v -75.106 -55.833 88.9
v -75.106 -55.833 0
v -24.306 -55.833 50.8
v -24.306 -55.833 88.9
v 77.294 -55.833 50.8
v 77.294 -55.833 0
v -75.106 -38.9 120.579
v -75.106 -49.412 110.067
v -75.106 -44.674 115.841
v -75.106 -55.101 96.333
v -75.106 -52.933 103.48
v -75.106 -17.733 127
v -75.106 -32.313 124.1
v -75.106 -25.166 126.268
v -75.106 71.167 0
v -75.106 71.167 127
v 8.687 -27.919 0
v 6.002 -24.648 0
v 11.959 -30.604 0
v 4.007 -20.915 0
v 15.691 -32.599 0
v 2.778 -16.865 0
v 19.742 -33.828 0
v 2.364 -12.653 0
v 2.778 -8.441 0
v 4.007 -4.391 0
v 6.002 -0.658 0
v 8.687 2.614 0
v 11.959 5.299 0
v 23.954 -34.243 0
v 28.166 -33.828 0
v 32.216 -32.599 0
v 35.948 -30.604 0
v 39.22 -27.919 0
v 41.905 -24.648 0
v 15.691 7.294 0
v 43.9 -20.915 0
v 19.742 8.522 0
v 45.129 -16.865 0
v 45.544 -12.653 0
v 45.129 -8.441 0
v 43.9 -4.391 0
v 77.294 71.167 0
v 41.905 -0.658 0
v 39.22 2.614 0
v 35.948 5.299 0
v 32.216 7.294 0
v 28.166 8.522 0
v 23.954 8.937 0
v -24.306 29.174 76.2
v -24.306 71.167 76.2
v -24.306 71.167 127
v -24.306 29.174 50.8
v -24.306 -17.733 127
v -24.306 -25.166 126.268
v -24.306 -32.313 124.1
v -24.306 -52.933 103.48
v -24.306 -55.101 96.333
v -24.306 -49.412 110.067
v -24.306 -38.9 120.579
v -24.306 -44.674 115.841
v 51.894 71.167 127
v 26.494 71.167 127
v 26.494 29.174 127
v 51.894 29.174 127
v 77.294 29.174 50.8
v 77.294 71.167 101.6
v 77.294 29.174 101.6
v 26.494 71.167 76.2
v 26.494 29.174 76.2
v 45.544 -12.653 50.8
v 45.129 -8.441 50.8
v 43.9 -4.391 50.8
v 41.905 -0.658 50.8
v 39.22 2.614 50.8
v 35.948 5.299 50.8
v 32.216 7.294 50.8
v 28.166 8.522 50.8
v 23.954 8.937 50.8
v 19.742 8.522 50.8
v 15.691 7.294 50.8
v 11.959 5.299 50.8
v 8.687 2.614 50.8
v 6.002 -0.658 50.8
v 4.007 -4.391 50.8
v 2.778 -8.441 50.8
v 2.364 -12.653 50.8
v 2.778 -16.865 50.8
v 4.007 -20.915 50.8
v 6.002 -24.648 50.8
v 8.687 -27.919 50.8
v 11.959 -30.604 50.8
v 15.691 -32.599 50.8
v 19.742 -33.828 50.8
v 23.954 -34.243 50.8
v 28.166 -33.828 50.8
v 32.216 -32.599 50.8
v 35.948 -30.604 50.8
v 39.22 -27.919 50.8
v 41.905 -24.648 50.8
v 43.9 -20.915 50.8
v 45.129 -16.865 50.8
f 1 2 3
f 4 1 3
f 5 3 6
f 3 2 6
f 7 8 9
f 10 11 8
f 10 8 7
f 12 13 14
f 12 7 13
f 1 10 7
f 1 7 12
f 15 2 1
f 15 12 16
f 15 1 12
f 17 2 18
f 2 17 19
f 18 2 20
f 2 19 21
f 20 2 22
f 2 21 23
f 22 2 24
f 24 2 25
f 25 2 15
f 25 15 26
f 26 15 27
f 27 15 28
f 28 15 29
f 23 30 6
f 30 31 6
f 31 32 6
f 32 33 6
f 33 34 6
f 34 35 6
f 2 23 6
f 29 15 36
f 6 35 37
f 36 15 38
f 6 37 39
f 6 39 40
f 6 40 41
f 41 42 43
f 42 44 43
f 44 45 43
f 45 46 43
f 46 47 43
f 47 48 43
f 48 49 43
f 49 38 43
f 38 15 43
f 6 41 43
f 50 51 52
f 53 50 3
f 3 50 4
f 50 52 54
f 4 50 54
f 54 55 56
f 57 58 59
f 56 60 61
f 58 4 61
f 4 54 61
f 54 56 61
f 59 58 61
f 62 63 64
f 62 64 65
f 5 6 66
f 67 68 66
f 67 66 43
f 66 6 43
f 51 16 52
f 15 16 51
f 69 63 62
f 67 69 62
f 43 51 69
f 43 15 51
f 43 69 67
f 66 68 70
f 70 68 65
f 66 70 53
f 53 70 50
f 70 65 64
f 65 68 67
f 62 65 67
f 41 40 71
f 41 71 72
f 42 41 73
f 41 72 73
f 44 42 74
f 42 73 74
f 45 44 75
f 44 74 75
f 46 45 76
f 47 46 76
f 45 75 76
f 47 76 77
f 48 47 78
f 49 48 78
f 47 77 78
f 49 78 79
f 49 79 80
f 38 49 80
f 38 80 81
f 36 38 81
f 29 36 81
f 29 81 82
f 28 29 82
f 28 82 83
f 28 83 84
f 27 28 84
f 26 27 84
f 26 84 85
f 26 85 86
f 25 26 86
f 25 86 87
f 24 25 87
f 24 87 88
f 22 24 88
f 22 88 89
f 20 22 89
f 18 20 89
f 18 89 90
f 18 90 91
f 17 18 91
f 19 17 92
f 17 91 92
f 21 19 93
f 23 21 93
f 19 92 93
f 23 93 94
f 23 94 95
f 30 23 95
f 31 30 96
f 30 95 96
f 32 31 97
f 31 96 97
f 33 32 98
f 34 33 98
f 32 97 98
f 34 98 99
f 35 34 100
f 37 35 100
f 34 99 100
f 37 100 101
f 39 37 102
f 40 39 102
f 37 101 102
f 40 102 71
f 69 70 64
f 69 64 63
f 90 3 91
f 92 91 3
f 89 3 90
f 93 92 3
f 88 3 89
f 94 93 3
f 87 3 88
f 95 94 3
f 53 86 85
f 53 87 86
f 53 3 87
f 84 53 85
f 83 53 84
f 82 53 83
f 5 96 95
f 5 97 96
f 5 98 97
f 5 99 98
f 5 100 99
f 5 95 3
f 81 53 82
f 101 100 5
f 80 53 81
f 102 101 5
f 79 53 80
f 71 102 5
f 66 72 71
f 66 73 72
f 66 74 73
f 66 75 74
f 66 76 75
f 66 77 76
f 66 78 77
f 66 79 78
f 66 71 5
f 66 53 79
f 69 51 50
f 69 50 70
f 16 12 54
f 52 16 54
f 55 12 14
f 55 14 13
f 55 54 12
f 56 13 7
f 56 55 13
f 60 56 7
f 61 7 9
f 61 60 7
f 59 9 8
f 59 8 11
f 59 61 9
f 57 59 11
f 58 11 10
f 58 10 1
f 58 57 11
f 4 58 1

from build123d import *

# Parameters (mm, degrees)
F0_W     = 152.4
F0_H     = 127
F1_DEPTH = 127
F3_DEPTH = 76.2
F4_W     = 50.8
F4_H     = 41.993012
F5_DEPTH = 50.8
F7_SIZE  = 25.4
F6_R     = 21.59
F8_DEPTH = 50.801
F9_R     = 38.1


with BuildPart() as f1:
    # F0 (on Top) → F1 (new body)
    with BuildSketch(Plane.XY):
        with Locations((1.093576, 7.667228)):
            Rectangle(F0_W, F0_H)
    extrude(amount=F1_DEPTH)

    # F2 (on face) → F3 (cut)
    with BuildSketch(Plane.XY.offset(127)):
        Polygon((26.493576, 29.174216), (-24.306424, 29.174216), (-24.306424, -55.832772), (77.293576, -55.832772), (77.293576, 29.174216), align=None)
    extrude(amount=-F3_DEPTH, mode=Mode.SUBTRACT)

    # F4 (on face) → F5 (cut)
    with BuildSketch(Plane.XY.offset(127)):
        with Locations((1.093576, 50.170722)):
            Rectangle(F4_W, F4_H)
    extrude(amount=-F5_DEPTH, mode=Mode.SUBTRACT)

    # F7
    f7_edges = [f1.edges().sort_by_distance(p)[0] for p in [
        (77.293576, 50.170722, 127),
    ]]
    chamfer(f7_edges, length=F7_SIZE)

    # F6 (on face) → F8 (cut, through all)
    with BuildSketch(Plane.XY.offset(50.8)):
        with Locations((23.953576, -12.652772)):
            Circle(F6_R)
    extrude(amount=-F8_DEPTH, mode=Mode.SUBTRACT)

    # F9
    f9_edges = [f1.edges().sort_by_distance(p)[0] for p in [
        (-49.706424, -55.832772, 127),
    ]]
    fillet(f9_edges, radius=F9_R)


solid = f1.part
